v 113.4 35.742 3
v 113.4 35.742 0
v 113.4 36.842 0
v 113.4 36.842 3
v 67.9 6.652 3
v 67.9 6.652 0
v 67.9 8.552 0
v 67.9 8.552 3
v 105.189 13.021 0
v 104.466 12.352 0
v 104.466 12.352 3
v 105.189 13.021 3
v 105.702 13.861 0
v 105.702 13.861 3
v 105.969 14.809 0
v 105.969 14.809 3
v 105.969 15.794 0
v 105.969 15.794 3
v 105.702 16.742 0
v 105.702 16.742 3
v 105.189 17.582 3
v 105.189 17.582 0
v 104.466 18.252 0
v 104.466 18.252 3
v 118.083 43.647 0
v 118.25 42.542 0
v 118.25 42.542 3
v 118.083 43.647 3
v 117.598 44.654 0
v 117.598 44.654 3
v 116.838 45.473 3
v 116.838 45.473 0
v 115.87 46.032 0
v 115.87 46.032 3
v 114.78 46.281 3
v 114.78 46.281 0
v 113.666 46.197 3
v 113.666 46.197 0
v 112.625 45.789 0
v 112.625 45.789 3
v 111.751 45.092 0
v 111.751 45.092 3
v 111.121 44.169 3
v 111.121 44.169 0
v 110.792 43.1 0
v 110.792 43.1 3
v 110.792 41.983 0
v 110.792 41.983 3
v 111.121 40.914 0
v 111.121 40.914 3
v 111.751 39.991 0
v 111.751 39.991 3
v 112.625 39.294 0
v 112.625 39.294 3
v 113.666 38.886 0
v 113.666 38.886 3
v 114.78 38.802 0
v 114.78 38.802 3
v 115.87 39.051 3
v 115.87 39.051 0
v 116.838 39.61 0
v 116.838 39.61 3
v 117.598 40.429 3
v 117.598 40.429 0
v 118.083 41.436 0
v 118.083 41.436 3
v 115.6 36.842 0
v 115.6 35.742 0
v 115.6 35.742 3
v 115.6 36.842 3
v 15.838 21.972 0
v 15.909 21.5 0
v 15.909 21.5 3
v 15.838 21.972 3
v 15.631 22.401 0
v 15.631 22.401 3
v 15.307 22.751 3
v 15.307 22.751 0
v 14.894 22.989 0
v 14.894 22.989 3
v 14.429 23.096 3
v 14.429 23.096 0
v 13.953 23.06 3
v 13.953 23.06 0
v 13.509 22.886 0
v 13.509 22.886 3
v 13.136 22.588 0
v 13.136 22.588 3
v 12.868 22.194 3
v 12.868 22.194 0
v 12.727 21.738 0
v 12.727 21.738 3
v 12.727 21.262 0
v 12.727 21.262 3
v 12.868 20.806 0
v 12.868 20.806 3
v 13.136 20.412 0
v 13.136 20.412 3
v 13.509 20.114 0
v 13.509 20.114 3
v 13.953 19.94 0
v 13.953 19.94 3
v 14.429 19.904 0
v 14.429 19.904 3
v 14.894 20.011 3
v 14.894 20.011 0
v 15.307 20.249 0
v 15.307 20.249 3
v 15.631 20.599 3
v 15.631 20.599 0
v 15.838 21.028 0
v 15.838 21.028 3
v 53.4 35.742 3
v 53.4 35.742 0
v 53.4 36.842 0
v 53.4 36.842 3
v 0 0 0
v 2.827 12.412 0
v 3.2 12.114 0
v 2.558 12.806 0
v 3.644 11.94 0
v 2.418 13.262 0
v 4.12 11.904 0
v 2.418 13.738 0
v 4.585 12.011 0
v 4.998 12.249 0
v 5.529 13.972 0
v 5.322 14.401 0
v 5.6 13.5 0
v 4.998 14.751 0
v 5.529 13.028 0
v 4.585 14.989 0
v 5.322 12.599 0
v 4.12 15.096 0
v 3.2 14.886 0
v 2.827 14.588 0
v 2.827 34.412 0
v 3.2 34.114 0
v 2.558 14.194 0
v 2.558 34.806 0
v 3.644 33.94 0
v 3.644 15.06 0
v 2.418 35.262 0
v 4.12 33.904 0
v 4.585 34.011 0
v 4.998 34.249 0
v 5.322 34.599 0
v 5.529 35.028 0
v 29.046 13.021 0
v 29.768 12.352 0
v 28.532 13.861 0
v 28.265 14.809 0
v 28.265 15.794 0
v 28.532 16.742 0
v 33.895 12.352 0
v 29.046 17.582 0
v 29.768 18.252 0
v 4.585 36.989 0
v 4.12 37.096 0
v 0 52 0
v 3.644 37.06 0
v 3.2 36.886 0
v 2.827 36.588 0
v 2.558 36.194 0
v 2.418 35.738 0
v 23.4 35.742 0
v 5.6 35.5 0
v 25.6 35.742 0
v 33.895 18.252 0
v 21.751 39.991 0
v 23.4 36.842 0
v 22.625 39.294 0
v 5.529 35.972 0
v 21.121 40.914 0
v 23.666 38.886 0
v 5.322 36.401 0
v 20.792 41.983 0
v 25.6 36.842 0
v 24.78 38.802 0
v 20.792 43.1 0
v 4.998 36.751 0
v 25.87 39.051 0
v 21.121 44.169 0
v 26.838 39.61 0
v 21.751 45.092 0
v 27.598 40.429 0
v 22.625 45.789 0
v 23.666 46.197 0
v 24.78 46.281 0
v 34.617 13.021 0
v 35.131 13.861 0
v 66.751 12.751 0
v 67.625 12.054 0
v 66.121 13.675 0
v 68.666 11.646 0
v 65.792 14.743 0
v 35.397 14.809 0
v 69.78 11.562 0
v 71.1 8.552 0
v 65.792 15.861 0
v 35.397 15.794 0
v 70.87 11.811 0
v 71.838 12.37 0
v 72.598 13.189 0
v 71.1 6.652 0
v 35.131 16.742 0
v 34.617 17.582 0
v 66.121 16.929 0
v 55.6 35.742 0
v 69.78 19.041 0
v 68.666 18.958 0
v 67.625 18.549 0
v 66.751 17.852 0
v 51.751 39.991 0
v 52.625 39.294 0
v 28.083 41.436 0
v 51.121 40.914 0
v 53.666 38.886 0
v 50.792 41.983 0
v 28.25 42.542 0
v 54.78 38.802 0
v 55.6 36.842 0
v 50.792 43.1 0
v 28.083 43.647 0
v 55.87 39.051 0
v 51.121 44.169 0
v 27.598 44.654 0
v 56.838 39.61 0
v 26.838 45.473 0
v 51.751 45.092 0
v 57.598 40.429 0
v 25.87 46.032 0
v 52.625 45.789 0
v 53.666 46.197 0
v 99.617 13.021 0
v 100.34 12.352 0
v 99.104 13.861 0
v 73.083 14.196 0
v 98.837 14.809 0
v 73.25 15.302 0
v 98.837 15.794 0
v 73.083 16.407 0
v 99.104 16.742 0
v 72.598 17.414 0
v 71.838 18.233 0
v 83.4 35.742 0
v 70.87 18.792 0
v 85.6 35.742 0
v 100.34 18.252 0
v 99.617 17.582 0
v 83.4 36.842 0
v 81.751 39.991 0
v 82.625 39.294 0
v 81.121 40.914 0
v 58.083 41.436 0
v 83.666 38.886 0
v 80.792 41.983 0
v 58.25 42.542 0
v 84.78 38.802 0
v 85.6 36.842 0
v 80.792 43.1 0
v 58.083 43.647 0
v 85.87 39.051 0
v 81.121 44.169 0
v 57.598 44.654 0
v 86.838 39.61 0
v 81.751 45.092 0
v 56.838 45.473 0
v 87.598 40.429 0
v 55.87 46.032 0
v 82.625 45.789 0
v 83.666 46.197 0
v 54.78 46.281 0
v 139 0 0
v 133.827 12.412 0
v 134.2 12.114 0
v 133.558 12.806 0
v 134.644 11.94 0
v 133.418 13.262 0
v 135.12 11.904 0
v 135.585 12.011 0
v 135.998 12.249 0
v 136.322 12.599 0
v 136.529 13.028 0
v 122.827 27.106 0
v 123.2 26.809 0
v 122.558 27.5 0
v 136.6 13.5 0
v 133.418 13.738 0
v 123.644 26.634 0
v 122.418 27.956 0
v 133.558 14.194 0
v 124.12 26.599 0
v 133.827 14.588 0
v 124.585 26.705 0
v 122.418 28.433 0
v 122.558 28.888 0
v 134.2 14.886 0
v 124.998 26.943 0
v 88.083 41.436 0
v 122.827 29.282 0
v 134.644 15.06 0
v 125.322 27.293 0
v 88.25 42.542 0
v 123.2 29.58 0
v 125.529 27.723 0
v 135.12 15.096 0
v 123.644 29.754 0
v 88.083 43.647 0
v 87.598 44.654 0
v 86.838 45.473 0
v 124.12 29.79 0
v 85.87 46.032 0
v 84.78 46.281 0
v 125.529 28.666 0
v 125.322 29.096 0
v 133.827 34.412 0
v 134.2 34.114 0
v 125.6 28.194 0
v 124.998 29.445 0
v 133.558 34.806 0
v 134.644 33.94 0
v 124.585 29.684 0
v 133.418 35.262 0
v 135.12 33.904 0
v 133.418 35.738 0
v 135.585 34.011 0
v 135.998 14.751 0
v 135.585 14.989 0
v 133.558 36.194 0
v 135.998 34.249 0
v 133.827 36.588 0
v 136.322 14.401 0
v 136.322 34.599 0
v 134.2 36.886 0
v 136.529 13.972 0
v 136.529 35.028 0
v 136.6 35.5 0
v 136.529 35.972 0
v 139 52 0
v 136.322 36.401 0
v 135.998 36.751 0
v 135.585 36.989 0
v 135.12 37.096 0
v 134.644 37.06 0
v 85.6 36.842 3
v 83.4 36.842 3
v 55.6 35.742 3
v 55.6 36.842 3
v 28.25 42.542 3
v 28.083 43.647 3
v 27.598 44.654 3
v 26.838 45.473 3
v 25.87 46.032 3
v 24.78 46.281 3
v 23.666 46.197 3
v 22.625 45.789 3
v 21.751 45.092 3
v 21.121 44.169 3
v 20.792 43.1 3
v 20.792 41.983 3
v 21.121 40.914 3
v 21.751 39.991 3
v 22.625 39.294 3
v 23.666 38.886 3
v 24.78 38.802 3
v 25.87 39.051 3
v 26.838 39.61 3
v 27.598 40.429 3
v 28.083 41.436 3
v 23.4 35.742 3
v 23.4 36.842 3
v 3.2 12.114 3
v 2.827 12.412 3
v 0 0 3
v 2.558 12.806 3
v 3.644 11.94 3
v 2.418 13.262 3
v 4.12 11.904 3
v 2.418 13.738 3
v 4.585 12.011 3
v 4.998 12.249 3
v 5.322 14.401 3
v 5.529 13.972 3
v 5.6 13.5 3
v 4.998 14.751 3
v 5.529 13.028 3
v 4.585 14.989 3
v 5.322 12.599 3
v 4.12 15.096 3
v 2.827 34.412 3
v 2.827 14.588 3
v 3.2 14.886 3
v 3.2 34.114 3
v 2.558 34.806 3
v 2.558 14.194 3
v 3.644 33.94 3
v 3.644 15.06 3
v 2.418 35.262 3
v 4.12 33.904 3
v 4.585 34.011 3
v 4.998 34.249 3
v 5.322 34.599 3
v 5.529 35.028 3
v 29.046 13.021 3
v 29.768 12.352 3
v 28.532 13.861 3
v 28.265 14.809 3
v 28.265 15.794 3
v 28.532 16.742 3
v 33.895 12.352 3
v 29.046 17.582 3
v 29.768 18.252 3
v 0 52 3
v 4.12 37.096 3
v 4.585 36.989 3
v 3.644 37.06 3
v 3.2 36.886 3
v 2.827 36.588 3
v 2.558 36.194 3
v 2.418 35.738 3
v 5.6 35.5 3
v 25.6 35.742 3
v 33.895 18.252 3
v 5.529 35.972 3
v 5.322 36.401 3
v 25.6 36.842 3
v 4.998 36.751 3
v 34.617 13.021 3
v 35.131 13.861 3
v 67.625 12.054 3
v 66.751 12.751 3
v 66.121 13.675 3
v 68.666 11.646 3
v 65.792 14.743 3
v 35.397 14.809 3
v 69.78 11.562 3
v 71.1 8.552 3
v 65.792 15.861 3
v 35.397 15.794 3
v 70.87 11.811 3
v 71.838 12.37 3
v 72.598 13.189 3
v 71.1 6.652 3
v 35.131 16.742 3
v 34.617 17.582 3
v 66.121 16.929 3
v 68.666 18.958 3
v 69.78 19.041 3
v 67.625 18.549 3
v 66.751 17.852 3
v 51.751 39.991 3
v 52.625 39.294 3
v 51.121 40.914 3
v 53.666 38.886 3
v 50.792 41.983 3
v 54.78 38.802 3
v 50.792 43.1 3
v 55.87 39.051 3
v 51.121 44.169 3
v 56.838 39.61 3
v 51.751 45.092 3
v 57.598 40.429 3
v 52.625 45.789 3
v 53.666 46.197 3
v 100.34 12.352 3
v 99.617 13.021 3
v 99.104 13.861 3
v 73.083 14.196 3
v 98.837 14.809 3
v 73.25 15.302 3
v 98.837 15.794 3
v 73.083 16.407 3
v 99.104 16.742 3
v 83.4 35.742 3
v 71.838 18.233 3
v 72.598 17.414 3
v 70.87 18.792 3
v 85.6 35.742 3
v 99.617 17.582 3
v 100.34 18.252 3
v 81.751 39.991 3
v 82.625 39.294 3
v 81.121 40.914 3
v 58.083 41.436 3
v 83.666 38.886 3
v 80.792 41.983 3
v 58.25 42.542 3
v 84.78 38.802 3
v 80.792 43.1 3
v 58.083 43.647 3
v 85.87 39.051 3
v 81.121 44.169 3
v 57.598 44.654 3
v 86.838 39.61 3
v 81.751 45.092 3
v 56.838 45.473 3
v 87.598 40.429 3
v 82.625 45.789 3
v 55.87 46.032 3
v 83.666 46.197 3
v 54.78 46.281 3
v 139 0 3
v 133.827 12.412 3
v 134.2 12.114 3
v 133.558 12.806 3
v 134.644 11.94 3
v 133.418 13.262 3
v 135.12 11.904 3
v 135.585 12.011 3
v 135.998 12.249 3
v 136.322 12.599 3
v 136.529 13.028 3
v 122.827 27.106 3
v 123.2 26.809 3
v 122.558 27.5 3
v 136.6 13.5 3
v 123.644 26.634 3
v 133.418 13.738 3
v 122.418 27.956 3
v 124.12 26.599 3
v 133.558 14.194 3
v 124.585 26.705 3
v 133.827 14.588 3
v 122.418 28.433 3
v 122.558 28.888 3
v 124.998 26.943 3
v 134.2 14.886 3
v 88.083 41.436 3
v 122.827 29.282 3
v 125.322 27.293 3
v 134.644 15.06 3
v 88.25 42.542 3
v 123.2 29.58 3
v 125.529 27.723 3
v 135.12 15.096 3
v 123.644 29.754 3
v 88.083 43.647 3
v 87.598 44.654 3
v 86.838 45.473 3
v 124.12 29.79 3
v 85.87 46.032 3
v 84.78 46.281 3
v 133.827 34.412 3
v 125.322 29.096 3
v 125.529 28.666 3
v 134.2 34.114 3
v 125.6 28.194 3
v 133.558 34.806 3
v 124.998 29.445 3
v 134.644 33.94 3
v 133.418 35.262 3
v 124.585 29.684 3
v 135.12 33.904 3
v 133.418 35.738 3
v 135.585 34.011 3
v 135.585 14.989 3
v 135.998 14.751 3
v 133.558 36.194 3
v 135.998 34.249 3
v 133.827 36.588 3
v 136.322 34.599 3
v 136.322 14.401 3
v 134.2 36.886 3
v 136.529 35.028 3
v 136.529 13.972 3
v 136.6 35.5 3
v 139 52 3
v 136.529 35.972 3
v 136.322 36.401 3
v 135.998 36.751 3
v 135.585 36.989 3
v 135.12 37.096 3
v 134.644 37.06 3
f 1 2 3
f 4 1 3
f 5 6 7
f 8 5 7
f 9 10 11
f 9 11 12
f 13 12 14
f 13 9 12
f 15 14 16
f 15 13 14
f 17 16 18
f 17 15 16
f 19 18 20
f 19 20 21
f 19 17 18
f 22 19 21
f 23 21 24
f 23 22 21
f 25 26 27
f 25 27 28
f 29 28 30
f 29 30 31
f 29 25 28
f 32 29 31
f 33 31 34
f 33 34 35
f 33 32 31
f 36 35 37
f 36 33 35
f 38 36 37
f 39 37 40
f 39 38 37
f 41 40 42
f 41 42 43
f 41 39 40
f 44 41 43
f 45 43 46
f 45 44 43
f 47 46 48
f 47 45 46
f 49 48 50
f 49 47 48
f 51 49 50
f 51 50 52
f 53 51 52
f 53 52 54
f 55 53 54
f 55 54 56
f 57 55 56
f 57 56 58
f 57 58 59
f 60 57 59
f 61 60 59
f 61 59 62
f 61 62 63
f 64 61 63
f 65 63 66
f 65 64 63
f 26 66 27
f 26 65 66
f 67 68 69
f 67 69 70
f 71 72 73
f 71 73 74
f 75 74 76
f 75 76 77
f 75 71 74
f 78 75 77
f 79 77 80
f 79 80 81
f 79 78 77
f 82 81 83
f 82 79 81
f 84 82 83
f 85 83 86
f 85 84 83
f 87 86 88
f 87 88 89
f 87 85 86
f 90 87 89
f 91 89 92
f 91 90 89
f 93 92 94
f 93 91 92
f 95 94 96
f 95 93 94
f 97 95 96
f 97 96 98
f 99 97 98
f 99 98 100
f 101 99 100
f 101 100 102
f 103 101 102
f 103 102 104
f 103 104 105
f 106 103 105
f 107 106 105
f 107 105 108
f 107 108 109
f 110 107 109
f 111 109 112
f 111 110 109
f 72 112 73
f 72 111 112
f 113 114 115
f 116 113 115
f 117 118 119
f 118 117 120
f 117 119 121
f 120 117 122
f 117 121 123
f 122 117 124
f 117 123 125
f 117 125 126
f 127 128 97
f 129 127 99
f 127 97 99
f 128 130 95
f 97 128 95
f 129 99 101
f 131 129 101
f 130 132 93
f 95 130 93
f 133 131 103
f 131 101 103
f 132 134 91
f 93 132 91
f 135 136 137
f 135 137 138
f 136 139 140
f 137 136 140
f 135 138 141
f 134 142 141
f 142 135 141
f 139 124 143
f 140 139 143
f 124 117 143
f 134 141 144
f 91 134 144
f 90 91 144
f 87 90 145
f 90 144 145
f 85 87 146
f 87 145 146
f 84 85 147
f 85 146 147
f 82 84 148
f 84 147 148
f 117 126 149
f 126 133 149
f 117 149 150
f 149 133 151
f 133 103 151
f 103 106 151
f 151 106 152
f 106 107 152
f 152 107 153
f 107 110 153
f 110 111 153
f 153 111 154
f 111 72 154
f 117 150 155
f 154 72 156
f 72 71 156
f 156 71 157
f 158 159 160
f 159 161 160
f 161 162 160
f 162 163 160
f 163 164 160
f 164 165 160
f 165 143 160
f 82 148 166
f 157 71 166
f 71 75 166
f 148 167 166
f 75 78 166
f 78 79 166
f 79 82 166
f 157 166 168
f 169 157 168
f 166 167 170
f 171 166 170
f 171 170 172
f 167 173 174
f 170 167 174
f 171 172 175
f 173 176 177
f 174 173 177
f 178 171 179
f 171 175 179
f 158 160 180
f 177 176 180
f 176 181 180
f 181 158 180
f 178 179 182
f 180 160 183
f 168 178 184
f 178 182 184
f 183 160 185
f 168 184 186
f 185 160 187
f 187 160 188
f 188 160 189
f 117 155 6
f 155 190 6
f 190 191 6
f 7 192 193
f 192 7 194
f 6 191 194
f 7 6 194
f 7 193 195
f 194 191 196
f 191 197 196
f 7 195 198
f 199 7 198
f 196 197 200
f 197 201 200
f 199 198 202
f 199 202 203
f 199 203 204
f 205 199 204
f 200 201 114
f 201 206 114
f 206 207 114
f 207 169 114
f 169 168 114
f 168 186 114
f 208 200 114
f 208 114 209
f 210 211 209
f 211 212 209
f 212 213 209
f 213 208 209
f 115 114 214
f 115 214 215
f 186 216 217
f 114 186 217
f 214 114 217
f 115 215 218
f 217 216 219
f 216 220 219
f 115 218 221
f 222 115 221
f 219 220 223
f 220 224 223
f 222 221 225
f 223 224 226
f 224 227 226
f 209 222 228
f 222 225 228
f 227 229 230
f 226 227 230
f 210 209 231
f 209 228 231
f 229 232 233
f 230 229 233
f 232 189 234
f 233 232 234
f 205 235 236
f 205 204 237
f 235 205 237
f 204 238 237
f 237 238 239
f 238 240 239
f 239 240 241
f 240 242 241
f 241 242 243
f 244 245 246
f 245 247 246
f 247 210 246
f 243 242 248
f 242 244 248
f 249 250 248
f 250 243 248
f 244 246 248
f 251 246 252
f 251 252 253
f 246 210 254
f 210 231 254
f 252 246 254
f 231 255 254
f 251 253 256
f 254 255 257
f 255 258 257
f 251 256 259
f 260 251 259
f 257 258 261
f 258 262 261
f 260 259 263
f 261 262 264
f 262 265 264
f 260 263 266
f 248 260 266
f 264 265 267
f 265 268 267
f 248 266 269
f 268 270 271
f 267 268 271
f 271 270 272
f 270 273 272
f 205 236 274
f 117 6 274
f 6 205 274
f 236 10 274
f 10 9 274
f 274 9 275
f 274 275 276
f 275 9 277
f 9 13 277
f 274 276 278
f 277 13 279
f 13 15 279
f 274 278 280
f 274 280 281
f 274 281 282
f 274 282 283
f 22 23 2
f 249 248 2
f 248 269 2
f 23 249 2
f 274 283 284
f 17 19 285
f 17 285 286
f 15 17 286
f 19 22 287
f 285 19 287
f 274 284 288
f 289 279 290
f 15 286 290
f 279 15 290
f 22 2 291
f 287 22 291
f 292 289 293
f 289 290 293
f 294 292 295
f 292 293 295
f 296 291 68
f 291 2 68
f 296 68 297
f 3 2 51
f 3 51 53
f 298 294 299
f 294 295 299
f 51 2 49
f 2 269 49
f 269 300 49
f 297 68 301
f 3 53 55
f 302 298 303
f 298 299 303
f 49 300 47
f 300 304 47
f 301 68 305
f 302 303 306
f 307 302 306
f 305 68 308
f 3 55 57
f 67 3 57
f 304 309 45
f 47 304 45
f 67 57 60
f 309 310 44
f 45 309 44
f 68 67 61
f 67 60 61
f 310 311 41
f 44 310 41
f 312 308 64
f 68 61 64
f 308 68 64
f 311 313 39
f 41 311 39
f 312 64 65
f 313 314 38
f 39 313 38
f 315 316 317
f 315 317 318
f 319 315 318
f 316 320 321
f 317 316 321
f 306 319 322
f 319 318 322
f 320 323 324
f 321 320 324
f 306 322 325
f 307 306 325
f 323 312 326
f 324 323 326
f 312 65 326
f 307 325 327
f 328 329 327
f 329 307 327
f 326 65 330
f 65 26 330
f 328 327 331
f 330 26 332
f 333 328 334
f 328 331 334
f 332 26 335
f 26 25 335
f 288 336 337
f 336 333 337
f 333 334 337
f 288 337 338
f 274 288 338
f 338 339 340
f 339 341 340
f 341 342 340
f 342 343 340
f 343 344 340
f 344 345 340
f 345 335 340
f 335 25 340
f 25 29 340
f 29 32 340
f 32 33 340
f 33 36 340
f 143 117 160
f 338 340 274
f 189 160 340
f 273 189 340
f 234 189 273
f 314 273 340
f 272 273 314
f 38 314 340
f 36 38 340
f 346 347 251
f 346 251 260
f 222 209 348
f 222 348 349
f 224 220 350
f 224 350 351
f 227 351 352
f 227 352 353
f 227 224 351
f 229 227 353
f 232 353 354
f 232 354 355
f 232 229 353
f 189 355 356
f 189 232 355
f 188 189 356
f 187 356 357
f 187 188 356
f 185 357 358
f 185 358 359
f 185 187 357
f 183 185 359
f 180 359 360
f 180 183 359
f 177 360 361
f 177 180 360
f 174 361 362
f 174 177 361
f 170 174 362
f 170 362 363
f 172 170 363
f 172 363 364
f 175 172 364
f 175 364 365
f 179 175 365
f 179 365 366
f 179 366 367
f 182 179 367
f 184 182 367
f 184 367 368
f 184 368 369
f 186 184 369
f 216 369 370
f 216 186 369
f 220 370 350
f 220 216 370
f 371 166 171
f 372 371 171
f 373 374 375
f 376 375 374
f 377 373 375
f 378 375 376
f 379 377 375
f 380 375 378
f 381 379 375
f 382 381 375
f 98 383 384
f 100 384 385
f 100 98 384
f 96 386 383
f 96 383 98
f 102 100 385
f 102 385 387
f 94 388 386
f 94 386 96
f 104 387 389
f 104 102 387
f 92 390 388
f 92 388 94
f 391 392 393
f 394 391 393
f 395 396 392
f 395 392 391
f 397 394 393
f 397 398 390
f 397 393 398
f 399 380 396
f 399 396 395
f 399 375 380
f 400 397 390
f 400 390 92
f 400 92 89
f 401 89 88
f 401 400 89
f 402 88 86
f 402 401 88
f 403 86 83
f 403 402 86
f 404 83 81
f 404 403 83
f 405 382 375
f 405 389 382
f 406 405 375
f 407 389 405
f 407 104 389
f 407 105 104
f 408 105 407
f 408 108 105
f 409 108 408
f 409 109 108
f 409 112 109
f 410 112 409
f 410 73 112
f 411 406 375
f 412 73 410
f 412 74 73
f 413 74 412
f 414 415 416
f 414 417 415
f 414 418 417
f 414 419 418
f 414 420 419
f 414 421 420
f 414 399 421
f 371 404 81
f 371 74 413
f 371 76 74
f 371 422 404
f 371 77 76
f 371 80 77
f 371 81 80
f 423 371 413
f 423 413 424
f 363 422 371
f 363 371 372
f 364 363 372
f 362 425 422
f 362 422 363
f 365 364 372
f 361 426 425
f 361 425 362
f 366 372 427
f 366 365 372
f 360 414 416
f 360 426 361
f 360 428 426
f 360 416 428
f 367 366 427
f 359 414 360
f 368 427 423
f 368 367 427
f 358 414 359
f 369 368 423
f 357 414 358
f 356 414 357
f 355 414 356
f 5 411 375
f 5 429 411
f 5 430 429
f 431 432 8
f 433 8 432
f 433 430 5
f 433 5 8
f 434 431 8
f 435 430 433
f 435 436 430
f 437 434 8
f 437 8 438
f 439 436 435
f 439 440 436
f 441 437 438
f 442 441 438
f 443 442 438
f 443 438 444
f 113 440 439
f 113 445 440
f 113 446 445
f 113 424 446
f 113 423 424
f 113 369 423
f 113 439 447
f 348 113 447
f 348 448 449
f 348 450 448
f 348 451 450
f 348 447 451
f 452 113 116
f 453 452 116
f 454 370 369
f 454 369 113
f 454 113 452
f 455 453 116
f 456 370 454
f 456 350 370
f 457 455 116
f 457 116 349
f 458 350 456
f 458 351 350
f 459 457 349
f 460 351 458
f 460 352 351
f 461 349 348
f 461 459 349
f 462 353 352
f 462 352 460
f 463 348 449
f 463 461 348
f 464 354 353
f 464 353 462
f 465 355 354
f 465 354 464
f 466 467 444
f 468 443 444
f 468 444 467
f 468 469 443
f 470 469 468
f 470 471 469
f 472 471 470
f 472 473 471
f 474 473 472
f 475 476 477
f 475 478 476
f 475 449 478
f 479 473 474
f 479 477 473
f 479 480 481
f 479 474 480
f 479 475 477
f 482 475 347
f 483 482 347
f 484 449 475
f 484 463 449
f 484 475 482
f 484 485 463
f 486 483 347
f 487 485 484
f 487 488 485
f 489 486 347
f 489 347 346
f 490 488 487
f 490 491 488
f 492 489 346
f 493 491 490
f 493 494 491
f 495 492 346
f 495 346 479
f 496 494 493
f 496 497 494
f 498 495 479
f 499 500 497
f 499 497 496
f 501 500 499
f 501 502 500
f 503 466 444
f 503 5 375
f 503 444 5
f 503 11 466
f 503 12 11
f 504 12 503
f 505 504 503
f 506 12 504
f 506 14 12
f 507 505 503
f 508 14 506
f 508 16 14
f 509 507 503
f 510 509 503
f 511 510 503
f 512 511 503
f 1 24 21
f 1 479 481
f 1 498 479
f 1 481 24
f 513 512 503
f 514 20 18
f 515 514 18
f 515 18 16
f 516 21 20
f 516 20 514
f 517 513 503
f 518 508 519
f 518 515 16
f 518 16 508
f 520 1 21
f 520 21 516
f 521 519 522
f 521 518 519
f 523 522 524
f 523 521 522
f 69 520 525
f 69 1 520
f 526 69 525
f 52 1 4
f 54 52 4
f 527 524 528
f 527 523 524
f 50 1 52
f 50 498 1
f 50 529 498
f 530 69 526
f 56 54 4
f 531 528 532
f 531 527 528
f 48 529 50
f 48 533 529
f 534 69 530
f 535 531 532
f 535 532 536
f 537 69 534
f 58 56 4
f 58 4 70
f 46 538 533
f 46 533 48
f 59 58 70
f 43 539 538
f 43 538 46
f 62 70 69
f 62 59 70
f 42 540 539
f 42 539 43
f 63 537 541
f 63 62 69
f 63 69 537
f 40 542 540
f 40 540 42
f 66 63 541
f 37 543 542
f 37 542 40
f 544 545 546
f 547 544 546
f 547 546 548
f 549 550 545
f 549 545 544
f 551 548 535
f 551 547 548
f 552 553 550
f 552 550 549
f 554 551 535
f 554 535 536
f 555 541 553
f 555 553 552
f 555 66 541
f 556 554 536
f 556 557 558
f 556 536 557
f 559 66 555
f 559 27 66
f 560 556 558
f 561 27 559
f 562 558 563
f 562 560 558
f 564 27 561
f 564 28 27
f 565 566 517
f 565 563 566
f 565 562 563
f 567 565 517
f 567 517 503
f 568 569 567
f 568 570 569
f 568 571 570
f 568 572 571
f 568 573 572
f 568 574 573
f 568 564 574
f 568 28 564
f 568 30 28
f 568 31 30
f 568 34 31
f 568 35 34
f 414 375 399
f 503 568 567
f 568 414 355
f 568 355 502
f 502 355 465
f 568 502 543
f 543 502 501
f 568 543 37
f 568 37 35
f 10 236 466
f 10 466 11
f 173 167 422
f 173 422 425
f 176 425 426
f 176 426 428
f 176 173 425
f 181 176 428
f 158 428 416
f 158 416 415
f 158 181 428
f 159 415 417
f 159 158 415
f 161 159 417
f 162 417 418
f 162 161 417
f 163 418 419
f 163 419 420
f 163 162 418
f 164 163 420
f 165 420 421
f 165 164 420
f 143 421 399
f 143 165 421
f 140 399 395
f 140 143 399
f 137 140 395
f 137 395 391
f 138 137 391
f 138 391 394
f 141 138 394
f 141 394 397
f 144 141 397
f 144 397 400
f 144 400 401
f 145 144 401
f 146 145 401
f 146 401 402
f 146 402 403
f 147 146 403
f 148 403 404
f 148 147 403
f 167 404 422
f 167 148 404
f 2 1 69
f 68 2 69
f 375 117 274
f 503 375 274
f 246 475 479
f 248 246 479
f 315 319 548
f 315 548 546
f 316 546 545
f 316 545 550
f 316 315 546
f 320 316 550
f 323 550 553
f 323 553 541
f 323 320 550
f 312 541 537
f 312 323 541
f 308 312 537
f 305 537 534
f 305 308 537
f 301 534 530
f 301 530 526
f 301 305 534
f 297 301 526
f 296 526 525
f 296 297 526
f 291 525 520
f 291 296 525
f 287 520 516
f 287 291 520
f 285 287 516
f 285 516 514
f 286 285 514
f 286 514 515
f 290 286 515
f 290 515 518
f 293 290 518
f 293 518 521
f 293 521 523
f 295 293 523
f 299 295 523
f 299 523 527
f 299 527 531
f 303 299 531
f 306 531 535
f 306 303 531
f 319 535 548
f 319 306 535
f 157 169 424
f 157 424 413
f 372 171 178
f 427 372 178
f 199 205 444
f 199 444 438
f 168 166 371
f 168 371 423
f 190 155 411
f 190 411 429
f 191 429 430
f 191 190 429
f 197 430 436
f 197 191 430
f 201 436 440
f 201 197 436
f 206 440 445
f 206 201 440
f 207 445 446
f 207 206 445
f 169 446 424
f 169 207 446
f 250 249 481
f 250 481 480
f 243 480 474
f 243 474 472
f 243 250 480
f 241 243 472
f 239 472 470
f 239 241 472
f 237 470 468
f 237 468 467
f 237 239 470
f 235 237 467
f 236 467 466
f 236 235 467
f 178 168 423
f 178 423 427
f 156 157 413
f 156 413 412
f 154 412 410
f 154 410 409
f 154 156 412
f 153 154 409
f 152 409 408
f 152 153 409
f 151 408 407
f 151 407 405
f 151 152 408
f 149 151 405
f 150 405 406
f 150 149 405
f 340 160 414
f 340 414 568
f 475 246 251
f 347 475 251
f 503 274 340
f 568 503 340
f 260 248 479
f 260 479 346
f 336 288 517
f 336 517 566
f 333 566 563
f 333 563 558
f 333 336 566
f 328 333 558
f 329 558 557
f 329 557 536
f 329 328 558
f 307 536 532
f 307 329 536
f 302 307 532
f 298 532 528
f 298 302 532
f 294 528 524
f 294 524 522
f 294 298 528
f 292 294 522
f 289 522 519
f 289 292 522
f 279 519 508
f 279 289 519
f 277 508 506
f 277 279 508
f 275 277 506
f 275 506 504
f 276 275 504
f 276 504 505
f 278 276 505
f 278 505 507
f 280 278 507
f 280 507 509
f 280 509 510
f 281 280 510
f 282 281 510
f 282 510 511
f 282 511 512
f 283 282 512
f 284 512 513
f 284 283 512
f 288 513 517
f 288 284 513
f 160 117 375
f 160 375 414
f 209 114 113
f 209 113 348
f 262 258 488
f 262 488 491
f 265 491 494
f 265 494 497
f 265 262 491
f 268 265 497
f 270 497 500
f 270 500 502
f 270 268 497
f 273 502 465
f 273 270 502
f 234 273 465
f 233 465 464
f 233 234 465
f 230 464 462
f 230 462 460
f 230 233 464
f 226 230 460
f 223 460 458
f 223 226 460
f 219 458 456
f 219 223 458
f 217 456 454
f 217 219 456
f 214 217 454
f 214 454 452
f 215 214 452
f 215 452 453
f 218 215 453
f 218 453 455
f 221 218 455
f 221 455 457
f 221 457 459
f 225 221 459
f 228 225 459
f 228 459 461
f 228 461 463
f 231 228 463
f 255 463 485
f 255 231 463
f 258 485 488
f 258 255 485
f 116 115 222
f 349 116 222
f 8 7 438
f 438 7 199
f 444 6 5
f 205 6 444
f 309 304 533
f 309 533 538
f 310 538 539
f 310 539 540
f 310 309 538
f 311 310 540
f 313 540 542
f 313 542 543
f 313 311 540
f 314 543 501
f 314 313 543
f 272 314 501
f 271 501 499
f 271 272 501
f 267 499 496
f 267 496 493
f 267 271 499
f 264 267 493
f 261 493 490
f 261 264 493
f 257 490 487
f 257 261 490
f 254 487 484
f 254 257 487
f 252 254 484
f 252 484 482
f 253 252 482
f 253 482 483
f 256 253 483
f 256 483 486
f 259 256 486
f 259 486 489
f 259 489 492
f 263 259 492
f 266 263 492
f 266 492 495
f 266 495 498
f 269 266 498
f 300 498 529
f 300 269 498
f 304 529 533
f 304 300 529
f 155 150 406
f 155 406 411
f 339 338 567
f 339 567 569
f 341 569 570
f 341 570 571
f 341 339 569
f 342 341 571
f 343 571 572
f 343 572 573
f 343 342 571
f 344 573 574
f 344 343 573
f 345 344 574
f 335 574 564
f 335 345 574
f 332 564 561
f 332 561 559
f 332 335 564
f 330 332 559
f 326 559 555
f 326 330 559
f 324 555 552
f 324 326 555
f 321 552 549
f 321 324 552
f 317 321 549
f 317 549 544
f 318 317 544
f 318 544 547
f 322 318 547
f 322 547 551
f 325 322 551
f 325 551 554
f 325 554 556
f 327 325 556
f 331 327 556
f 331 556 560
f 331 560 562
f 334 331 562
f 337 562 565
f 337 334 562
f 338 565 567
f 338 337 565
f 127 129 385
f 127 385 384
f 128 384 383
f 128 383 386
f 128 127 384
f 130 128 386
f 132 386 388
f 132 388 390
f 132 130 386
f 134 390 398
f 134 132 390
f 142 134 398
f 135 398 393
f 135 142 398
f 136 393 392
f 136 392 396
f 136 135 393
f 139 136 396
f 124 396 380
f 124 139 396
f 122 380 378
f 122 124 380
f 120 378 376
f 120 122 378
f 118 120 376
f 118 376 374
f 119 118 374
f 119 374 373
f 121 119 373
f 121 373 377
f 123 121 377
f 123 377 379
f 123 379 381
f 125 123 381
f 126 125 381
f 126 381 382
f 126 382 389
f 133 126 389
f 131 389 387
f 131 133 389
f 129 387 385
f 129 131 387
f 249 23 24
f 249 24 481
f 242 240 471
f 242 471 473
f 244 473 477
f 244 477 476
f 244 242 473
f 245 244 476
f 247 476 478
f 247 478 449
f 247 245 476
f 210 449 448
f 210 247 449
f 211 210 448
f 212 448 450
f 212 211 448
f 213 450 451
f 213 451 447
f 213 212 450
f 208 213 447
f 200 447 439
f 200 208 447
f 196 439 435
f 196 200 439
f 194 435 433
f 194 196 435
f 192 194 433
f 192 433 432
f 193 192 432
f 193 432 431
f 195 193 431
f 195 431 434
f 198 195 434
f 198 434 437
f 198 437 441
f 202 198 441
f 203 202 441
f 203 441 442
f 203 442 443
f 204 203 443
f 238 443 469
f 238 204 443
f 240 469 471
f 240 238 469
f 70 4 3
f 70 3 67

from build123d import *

# Parameters (mm, degrees)
SKETCH1_W           = 139
SKETCH1_H           = 52
SKETCH1_R           = 1.6
SKETCH1_R_2         = 3.75
SKETCH1_W_2         = 3.2
SKETCH1_H_2         = 1.9
SKETCH1_W_3         = 2.2
SKETCH1_H_3         = 1.1
BOSS_EXTRUDE1_DEPTH = 3


with BuildPart() as part:
    # Sketch1 → Boss-Extrude1 (new body)
    with BuildSketch(Plane.XY):
        with Locations((69.5, 26)):
            Rectangle(SKETCH1_W, SKETCH1_H)
        with Locations((4, 35.5)):
            Circle(SKETCH1_R, mode=Mode.SUBTRACT)
        with Locations((135, 35.5)):
            Circle(SKETCH1_R, mode=Mode.SUBTRACT)
        with Locations((135, 13.5)):
            Circle(SKETCH1_R, mode=Mode.SUBTRACT)
        with Locations((4, 13.5)):
            Circle(SKETCH1_R, mode=Mode.SUBTRACT)
        with Locations((14.309088021, 21.5)):
            Circle(SKETCH1_R, mode=Mode.SUBTRACT)
        with Locations((124, 28.19419762)):
            Circle(SKETCH1_R, mode=Mode.SUBTRACT)
        with Locations((69.5, 15.301613352)):
            Circle(SKETCH1_R_2, mode=Mode.SUBTRACT)
        with Locations((24.5, 42.541519479)):
            Circle(SKETCH1_R_2, mode=Mode.SUBTRACT)
        with Locations((54.5, 42.541519479)):
            Circle(SKETCH1_R_2, mode=Mode.SUBTRACT)
        with Locations((84.5, 42.541519479)):
            Circle(SKETCH1_R_2, mode=Mode.SUBTRACT)
        with Locations((114.5, 42.541519479)):
            Circle(SKETCH1_R_2, mode=Mode.SUBTRACT)
        with Locations((69.5, 7.601613352)):
            Rectangle(SKETCH1_W_2, SKETCH1_H_2, mode=Mode.SUBTRACT)
        with Locations((24.5, 36.291519479)):
            Rectangle(SKETCH1_W_3, SKETCH1_H_3, mode=Mode.SUBTRACT)
        with BuildLine():
            Line((100.339676821, 12.351613352), (104.466418878, 12.351613352))
            ThreePointArc((104.466418878, 12.351613352), (106.003047849, 15.301613352), (104.466418878, 18.251613352))
            Line((104.466418878, 18.251613352), (100.339676821, 18.251613352))
            ThreePointArc((100.339676821, 18.251613352), (98.803047849, 15.301613352), (100.339676821, 12.351613352))
        make_face(mode=Mode.SUBTRACT)
        with BuildLine():
            Line((29.767863143, 12.351613352), (33.894605199, 12.351613352))
            ThreePointArc((33.894605199, 12.351613352), (35.431234171, 15.301613352), (33.894605199, 18.251613352))
            Line((33.894605199, 18.251613352), (29.767863143, 18.251613352))
            ThreePointArc((29.767863143, 18.251613352), (28.231234171, 15.301613352), (29.767863143, 12.351613352))
        make_face(mode=Mode.SUBTRACT)
        with Locations((54.5, 36.291519479)):
            Rectangle(SKETCH1_W_3, SKETCH1_H_3, mode=Mode.SUBTRACT)
        with Locations((84.5, 36.291519479)):
            Rectangle(SKETCH1_W_3, SKETCH1_H_3, mode=Mode.SUBTRACT)
        with Locations((114.5, 36.291519479)):
            Rectangle(SKETCH1_W_3, SKETCH1_H_3, mode=Mode.SUBTRACT)
    extrude(amount=BOSS_EXTRUDE1_DEPTH)


solid = part.part
